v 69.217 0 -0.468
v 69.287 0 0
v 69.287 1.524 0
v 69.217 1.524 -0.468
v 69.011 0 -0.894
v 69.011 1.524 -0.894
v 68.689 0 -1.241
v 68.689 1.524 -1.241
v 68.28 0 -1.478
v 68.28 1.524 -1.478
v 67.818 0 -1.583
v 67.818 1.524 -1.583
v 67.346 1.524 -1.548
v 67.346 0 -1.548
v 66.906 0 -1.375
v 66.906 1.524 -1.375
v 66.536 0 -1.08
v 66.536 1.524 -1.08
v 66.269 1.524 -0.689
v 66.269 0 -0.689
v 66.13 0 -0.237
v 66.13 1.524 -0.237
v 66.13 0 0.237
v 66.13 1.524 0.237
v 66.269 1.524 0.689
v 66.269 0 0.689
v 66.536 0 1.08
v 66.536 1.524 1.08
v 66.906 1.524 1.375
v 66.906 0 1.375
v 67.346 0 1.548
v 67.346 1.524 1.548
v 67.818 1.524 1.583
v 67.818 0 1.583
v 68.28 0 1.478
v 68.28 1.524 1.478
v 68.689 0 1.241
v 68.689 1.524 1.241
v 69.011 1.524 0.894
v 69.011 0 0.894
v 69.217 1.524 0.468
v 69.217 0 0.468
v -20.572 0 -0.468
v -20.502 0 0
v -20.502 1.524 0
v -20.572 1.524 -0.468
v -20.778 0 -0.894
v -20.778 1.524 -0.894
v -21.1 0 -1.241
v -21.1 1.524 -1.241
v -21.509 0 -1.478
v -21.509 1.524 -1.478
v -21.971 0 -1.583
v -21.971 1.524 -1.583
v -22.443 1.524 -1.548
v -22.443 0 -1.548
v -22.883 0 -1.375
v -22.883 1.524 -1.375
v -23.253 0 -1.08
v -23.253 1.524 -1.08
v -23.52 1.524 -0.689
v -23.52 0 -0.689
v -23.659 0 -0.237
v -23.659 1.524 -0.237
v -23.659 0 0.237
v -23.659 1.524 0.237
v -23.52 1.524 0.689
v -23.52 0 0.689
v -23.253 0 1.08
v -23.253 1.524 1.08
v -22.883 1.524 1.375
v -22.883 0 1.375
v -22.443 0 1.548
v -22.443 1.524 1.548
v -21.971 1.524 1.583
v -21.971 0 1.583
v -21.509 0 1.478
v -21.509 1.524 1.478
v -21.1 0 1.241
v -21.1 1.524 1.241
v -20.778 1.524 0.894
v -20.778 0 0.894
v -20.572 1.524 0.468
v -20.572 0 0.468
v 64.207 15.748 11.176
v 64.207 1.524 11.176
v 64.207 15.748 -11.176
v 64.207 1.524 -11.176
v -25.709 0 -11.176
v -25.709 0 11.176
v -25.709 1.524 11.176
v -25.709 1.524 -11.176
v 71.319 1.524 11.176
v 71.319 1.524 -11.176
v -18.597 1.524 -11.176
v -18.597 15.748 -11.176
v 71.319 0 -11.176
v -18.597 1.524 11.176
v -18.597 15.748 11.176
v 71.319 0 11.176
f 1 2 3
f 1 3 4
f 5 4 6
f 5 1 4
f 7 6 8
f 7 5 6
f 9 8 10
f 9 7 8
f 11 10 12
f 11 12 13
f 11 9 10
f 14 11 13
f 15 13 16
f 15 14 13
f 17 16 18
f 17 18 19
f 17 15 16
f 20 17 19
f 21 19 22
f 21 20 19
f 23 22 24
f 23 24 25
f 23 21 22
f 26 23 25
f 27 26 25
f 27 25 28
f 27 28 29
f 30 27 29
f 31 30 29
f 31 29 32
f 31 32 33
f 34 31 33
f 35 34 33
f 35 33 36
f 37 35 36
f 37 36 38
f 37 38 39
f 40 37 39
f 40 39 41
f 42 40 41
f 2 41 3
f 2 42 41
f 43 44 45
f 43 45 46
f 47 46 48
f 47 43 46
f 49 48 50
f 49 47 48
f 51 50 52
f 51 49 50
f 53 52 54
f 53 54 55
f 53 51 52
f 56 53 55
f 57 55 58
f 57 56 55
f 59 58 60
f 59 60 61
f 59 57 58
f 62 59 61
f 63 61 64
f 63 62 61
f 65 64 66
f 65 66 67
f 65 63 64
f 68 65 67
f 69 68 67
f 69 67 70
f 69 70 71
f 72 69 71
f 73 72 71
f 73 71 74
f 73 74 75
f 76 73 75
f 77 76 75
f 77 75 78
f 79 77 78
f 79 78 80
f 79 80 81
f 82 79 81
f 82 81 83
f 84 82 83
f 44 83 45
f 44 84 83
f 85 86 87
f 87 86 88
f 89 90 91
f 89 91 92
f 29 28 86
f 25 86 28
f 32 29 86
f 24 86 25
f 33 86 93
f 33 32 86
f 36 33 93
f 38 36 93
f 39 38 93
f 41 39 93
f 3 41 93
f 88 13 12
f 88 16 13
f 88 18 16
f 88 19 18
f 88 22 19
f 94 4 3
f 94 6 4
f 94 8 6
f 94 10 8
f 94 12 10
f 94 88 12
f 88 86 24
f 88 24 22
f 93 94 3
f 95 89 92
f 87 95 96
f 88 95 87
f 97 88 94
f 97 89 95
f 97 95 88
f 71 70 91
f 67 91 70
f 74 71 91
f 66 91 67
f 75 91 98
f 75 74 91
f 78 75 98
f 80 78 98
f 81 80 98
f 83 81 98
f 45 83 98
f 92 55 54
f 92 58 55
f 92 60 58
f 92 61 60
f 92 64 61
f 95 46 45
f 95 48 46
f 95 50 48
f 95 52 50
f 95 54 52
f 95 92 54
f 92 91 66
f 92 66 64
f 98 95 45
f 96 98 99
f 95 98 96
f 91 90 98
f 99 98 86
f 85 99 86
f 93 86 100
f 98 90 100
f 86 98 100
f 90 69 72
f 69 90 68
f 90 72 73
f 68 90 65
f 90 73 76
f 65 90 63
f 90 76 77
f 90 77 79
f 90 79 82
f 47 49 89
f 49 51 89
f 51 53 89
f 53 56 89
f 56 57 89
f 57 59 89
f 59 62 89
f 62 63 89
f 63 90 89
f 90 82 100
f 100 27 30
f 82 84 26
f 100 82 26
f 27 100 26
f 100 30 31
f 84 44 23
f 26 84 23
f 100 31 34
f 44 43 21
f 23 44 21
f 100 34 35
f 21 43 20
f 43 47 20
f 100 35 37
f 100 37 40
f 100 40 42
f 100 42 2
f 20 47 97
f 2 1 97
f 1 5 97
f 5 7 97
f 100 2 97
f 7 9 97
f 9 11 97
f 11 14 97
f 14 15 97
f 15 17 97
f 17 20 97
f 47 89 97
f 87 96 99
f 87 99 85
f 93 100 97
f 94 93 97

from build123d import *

# Parameters (mm, degrees)
SKETCH1_W           = 97.028
SKETCH1_H           = 22.352
SKETCH1_R           = 1.5875
BOSS_EXTRUDE1_DEPTH = 1.524
SKETCH1_3_W         = 82.804
SKETCH1_3_H         = 22.352
BOSS_EXTRUDE2_DEPTH = 15.748


with BuildPart() as part:
    # Sketch1 → Boss-Extrude1 (new body)
    with BuildSketch(Plane(origin=(0, 0, 0), x_dir=(1, 0, 0), z_dir=(0, 1, 0))):
        with Locations((22.805106227, 0)):
            Rectangle(SKETCH1_W, SKETCH1_H)
        with Locations((-22.089393773, 0)):
            Circle(SKETCH1_R, mode=Mode.SUBTRACT)
        with Locations((67.699606227, 0)):
            Circle(SKETCH1_R, mode=Mode.SUBTRACT)
    extrude(amount=BOSS_EXTRUDE1_DEPTH)

    # Sketch1<3> → Boss-Extrude2 (add)
    with BuildSketch(Plane(origin=(0, 0, 0), x_dir=(1, 0, 0), z_dir=(0, 1, 0))):
        with Locations((22.805106227, 0)):
            Rectangle(SKETCH1_3_W, SKETCH1_3_H)
    extrude(amount=BOSS_EXTRUDE2_DEPTH)


solid = part.part
